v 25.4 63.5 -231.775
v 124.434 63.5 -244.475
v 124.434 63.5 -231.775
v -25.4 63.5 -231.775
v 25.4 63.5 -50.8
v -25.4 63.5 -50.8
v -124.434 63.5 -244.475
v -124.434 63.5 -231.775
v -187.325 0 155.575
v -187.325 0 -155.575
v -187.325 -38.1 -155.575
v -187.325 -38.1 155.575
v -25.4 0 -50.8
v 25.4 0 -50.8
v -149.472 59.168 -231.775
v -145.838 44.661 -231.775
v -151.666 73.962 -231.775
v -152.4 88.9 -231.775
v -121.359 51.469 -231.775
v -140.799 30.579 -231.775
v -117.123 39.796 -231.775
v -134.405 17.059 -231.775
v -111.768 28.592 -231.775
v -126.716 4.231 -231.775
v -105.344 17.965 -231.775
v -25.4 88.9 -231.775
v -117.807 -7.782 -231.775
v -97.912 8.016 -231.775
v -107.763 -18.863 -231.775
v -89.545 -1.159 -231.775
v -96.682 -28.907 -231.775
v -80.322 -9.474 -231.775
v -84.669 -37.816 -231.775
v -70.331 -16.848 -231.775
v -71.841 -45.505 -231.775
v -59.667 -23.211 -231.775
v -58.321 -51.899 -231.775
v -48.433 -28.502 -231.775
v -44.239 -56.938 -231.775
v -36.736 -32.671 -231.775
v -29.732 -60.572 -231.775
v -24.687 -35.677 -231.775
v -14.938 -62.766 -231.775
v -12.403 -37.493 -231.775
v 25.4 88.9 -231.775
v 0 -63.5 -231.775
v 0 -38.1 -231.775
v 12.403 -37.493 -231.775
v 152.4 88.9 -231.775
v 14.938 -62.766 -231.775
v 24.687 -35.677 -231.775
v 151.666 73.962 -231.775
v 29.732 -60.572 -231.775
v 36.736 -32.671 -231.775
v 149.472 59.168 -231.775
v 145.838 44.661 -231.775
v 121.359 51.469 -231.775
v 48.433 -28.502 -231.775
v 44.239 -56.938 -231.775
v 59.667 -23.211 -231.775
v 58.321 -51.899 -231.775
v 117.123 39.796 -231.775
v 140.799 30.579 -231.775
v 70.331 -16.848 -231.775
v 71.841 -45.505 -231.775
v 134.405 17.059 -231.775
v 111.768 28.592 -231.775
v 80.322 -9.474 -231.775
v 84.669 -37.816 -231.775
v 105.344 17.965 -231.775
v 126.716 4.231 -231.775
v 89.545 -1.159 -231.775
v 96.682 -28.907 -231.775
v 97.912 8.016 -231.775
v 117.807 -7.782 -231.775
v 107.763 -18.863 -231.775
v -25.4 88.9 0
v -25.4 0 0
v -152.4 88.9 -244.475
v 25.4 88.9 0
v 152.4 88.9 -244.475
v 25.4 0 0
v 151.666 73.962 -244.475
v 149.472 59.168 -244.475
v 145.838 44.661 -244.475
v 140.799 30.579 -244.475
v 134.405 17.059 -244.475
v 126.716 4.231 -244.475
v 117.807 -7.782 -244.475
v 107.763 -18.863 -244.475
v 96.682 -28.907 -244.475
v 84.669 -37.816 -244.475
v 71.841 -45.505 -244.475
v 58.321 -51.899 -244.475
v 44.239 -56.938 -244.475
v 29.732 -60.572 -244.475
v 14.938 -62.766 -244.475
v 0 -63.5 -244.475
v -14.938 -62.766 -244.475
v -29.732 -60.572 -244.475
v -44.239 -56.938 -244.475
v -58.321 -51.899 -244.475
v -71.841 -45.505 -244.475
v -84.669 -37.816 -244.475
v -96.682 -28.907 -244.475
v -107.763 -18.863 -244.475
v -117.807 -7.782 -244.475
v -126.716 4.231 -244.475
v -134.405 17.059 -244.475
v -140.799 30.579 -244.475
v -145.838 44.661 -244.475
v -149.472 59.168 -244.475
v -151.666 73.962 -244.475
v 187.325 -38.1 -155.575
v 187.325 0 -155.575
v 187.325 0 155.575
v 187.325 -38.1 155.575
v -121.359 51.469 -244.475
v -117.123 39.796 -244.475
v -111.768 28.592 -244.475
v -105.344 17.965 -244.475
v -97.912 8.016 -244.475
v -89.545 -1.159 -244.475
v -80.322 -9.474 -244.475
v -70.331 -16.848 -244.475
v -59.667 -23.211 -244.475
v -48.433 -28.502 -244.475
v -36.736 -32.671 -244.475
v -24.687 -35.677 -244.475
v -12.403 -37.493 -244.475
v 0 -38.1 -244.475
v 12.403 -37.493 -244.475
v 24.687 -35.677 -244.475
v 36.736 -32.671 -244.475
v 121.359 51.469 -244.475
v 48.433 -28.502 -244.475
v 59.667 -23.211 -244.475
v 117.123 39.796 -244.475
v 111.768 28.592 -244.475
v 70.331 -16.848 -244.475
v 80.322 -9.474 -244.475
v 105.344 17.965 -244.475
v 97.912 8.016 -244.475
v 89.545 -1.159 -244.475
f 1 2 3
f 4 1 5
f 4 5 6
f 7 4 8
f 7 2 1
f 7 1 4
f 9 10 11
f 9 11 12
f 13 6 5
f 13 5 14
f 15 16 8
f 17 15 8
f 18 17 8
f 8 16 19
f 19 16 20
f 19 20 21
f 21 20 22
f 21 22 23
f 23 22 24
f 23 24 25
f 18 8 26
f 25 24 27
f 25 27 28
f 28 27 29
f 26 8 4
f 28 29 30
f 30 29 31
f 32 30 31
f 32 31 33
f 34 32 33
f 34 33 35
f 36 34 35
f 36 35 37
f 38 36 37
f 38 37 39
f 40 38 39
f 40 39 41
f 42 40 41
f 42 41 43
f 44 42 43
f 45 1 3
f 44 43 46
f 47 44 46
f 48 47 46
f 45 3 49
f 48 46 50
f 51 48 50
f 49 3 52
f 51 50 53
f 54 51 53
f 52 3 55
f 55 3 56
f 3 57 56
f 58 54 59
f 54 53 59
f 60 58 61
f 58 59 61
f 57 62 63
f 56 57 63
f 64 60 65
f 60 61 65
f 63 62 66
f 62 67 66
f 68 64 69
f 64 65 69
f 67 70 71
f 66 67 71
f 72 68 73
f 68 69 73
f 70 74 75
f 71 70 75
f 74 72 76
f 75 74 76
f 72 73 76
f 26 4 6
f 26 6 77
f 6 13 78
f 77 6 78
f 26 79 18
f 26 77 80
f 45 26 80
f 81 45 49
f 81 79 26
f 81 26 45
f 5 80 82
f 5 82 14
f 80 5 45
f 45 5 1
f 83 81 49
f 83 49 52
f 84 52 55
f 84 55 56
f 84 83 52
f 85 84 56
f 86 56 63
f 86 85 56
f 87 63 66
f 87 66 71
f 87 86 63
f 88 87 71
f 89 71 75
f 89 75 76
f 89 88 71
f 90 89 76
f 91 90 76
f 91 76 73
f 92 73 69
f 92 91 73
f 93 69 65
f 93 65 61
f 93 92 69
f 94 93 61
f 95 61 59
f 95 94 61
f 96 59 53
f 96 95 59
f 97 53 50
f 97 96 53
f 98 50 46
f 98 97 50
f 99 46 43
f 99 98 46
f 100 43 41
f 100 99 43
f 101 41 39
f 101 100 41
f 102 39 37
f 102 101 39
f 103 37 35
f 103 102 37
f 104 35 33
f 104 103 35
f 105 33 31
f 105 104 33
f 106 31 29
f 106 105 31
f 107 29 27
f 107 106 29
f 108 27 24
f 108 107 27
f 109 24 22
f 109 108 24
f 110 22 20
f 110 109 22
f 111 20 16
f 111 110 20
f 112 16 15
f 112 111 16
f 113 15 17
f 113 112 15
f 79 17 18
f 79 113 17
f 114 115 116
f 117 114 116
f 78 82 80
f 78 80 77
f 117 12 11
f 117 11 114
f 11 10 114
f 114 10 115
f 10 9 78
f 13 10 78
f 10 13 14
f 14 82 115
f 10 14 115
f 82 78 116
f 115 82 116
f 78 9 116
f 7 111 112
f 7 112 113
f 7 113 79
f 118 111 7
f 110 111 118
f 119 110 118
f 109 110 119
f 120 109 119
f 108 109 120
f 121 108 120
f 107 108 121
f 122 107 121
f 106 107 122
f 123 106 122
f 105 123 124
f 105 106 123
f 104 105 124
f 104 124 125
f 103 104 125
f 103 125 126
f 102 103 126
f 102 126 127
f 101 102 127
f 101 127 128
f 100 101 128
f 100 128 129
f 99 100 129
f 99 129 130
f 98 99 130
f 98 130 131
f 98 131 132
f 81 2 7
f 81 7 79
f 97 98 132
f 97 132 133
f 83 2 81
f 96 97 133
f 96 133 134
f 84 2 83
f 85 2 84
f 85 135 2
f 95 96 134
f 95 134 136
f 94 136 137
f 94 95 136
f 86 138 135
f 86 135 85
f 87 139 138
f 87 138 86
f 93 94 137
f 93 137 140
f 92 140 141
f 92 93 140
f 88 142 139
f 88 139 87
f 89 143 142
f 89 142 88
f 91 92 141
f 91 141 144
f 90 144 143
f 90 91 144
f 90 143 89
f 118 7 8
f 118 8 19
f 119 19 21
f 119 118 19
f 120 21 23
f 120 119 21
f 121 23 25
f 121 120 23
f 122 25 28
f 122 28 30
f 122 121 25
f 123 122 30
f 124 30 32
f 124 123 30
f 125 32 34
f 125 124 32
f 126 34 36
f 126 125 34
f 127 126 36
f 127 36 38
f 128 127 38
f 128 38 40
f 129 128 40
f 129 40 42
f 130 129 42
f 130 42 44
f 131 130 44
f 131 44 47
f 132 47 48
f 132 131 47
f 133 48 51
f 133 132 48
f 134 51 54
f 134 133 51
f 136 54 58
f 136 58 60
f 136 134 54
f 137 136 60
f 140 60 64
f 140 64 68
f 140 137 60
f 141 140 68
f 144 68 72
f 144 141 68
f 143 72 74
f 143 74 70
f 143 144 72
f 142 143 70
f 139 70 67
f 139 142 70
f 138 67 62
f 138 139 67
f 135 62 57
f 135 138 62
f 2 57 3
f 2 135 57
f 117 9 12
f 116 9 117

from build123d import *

# Parameters (mm, degrees)
F0_W     = 374.65
F0_H     = 311.15
F1_DEPTH = 38.1
F2_W     = 50.8
F2_H     = 88.9
F2_H_2   = 155.575
F3_DEPTH = 88.9
F4_W     = 63.5
F4_H     = 193.675
F5_DEPTH = 212.726
F7_DEPTH = 12.7


with BuildPart() as f1:
    # F0 (on Front) → F1 (new body)
    with BuildSketch(Plane.XZ):
        Rectangle(F0_W, F0_H)
    extrude(amount=F1_DEPTH)

    # F2 (on face) → F3 (join)
    with BuildSketch(Plane(origin=(0, 0, 0), x_dir=(-1, 0, 0), z_dir=(0, 1, 0))):
        with Locations((0, -200.025)):
            Rectangle(F2_W, F2_H)
        with Locations((0, -77.7875)):
            Rectangle(F2_W, F2_H_2)
    extrude(amount=F3_DEPTH)

    # F4 (on face) → F5 (cut, through all)
    with BuildSketch(Plane(origin=(-25.4, 0, 0), x_dir=(0, -1, 0), z_dir=(-1, 0, 0))):
        with Locations((-31.75, -147.6375)):
            Rectangle(F4_W, F4_H)
    extrude(amount=-F5_DEPTH, mode=Mode.SUBTRACT)

    # F6 (on face) → F7 (join)
    with BuildSketch(Plane(origin=(0, 0, -244.475), x_dir=(1, 0, 0), z_dir=(0, 0, -1))):
        with BuildLine():
            Line((-152.4, -88.9), (152.4, -88.9))
            ThreePointArc((152.4, -88.9), (0, 63.5), (-152.4, -88.9))
        make_face()
        with BuildLine():
            ThreePointArc((-124.434079, -63.5), (0, 38.1), (124.434079, -63.5))
            Line((124.434079, -63.5), (-124.434079, -63.5))
        make_face(mode=Mode.SUBTRACT)
    extrude(amount=-F7_DEPTH)


solid = f1.part
